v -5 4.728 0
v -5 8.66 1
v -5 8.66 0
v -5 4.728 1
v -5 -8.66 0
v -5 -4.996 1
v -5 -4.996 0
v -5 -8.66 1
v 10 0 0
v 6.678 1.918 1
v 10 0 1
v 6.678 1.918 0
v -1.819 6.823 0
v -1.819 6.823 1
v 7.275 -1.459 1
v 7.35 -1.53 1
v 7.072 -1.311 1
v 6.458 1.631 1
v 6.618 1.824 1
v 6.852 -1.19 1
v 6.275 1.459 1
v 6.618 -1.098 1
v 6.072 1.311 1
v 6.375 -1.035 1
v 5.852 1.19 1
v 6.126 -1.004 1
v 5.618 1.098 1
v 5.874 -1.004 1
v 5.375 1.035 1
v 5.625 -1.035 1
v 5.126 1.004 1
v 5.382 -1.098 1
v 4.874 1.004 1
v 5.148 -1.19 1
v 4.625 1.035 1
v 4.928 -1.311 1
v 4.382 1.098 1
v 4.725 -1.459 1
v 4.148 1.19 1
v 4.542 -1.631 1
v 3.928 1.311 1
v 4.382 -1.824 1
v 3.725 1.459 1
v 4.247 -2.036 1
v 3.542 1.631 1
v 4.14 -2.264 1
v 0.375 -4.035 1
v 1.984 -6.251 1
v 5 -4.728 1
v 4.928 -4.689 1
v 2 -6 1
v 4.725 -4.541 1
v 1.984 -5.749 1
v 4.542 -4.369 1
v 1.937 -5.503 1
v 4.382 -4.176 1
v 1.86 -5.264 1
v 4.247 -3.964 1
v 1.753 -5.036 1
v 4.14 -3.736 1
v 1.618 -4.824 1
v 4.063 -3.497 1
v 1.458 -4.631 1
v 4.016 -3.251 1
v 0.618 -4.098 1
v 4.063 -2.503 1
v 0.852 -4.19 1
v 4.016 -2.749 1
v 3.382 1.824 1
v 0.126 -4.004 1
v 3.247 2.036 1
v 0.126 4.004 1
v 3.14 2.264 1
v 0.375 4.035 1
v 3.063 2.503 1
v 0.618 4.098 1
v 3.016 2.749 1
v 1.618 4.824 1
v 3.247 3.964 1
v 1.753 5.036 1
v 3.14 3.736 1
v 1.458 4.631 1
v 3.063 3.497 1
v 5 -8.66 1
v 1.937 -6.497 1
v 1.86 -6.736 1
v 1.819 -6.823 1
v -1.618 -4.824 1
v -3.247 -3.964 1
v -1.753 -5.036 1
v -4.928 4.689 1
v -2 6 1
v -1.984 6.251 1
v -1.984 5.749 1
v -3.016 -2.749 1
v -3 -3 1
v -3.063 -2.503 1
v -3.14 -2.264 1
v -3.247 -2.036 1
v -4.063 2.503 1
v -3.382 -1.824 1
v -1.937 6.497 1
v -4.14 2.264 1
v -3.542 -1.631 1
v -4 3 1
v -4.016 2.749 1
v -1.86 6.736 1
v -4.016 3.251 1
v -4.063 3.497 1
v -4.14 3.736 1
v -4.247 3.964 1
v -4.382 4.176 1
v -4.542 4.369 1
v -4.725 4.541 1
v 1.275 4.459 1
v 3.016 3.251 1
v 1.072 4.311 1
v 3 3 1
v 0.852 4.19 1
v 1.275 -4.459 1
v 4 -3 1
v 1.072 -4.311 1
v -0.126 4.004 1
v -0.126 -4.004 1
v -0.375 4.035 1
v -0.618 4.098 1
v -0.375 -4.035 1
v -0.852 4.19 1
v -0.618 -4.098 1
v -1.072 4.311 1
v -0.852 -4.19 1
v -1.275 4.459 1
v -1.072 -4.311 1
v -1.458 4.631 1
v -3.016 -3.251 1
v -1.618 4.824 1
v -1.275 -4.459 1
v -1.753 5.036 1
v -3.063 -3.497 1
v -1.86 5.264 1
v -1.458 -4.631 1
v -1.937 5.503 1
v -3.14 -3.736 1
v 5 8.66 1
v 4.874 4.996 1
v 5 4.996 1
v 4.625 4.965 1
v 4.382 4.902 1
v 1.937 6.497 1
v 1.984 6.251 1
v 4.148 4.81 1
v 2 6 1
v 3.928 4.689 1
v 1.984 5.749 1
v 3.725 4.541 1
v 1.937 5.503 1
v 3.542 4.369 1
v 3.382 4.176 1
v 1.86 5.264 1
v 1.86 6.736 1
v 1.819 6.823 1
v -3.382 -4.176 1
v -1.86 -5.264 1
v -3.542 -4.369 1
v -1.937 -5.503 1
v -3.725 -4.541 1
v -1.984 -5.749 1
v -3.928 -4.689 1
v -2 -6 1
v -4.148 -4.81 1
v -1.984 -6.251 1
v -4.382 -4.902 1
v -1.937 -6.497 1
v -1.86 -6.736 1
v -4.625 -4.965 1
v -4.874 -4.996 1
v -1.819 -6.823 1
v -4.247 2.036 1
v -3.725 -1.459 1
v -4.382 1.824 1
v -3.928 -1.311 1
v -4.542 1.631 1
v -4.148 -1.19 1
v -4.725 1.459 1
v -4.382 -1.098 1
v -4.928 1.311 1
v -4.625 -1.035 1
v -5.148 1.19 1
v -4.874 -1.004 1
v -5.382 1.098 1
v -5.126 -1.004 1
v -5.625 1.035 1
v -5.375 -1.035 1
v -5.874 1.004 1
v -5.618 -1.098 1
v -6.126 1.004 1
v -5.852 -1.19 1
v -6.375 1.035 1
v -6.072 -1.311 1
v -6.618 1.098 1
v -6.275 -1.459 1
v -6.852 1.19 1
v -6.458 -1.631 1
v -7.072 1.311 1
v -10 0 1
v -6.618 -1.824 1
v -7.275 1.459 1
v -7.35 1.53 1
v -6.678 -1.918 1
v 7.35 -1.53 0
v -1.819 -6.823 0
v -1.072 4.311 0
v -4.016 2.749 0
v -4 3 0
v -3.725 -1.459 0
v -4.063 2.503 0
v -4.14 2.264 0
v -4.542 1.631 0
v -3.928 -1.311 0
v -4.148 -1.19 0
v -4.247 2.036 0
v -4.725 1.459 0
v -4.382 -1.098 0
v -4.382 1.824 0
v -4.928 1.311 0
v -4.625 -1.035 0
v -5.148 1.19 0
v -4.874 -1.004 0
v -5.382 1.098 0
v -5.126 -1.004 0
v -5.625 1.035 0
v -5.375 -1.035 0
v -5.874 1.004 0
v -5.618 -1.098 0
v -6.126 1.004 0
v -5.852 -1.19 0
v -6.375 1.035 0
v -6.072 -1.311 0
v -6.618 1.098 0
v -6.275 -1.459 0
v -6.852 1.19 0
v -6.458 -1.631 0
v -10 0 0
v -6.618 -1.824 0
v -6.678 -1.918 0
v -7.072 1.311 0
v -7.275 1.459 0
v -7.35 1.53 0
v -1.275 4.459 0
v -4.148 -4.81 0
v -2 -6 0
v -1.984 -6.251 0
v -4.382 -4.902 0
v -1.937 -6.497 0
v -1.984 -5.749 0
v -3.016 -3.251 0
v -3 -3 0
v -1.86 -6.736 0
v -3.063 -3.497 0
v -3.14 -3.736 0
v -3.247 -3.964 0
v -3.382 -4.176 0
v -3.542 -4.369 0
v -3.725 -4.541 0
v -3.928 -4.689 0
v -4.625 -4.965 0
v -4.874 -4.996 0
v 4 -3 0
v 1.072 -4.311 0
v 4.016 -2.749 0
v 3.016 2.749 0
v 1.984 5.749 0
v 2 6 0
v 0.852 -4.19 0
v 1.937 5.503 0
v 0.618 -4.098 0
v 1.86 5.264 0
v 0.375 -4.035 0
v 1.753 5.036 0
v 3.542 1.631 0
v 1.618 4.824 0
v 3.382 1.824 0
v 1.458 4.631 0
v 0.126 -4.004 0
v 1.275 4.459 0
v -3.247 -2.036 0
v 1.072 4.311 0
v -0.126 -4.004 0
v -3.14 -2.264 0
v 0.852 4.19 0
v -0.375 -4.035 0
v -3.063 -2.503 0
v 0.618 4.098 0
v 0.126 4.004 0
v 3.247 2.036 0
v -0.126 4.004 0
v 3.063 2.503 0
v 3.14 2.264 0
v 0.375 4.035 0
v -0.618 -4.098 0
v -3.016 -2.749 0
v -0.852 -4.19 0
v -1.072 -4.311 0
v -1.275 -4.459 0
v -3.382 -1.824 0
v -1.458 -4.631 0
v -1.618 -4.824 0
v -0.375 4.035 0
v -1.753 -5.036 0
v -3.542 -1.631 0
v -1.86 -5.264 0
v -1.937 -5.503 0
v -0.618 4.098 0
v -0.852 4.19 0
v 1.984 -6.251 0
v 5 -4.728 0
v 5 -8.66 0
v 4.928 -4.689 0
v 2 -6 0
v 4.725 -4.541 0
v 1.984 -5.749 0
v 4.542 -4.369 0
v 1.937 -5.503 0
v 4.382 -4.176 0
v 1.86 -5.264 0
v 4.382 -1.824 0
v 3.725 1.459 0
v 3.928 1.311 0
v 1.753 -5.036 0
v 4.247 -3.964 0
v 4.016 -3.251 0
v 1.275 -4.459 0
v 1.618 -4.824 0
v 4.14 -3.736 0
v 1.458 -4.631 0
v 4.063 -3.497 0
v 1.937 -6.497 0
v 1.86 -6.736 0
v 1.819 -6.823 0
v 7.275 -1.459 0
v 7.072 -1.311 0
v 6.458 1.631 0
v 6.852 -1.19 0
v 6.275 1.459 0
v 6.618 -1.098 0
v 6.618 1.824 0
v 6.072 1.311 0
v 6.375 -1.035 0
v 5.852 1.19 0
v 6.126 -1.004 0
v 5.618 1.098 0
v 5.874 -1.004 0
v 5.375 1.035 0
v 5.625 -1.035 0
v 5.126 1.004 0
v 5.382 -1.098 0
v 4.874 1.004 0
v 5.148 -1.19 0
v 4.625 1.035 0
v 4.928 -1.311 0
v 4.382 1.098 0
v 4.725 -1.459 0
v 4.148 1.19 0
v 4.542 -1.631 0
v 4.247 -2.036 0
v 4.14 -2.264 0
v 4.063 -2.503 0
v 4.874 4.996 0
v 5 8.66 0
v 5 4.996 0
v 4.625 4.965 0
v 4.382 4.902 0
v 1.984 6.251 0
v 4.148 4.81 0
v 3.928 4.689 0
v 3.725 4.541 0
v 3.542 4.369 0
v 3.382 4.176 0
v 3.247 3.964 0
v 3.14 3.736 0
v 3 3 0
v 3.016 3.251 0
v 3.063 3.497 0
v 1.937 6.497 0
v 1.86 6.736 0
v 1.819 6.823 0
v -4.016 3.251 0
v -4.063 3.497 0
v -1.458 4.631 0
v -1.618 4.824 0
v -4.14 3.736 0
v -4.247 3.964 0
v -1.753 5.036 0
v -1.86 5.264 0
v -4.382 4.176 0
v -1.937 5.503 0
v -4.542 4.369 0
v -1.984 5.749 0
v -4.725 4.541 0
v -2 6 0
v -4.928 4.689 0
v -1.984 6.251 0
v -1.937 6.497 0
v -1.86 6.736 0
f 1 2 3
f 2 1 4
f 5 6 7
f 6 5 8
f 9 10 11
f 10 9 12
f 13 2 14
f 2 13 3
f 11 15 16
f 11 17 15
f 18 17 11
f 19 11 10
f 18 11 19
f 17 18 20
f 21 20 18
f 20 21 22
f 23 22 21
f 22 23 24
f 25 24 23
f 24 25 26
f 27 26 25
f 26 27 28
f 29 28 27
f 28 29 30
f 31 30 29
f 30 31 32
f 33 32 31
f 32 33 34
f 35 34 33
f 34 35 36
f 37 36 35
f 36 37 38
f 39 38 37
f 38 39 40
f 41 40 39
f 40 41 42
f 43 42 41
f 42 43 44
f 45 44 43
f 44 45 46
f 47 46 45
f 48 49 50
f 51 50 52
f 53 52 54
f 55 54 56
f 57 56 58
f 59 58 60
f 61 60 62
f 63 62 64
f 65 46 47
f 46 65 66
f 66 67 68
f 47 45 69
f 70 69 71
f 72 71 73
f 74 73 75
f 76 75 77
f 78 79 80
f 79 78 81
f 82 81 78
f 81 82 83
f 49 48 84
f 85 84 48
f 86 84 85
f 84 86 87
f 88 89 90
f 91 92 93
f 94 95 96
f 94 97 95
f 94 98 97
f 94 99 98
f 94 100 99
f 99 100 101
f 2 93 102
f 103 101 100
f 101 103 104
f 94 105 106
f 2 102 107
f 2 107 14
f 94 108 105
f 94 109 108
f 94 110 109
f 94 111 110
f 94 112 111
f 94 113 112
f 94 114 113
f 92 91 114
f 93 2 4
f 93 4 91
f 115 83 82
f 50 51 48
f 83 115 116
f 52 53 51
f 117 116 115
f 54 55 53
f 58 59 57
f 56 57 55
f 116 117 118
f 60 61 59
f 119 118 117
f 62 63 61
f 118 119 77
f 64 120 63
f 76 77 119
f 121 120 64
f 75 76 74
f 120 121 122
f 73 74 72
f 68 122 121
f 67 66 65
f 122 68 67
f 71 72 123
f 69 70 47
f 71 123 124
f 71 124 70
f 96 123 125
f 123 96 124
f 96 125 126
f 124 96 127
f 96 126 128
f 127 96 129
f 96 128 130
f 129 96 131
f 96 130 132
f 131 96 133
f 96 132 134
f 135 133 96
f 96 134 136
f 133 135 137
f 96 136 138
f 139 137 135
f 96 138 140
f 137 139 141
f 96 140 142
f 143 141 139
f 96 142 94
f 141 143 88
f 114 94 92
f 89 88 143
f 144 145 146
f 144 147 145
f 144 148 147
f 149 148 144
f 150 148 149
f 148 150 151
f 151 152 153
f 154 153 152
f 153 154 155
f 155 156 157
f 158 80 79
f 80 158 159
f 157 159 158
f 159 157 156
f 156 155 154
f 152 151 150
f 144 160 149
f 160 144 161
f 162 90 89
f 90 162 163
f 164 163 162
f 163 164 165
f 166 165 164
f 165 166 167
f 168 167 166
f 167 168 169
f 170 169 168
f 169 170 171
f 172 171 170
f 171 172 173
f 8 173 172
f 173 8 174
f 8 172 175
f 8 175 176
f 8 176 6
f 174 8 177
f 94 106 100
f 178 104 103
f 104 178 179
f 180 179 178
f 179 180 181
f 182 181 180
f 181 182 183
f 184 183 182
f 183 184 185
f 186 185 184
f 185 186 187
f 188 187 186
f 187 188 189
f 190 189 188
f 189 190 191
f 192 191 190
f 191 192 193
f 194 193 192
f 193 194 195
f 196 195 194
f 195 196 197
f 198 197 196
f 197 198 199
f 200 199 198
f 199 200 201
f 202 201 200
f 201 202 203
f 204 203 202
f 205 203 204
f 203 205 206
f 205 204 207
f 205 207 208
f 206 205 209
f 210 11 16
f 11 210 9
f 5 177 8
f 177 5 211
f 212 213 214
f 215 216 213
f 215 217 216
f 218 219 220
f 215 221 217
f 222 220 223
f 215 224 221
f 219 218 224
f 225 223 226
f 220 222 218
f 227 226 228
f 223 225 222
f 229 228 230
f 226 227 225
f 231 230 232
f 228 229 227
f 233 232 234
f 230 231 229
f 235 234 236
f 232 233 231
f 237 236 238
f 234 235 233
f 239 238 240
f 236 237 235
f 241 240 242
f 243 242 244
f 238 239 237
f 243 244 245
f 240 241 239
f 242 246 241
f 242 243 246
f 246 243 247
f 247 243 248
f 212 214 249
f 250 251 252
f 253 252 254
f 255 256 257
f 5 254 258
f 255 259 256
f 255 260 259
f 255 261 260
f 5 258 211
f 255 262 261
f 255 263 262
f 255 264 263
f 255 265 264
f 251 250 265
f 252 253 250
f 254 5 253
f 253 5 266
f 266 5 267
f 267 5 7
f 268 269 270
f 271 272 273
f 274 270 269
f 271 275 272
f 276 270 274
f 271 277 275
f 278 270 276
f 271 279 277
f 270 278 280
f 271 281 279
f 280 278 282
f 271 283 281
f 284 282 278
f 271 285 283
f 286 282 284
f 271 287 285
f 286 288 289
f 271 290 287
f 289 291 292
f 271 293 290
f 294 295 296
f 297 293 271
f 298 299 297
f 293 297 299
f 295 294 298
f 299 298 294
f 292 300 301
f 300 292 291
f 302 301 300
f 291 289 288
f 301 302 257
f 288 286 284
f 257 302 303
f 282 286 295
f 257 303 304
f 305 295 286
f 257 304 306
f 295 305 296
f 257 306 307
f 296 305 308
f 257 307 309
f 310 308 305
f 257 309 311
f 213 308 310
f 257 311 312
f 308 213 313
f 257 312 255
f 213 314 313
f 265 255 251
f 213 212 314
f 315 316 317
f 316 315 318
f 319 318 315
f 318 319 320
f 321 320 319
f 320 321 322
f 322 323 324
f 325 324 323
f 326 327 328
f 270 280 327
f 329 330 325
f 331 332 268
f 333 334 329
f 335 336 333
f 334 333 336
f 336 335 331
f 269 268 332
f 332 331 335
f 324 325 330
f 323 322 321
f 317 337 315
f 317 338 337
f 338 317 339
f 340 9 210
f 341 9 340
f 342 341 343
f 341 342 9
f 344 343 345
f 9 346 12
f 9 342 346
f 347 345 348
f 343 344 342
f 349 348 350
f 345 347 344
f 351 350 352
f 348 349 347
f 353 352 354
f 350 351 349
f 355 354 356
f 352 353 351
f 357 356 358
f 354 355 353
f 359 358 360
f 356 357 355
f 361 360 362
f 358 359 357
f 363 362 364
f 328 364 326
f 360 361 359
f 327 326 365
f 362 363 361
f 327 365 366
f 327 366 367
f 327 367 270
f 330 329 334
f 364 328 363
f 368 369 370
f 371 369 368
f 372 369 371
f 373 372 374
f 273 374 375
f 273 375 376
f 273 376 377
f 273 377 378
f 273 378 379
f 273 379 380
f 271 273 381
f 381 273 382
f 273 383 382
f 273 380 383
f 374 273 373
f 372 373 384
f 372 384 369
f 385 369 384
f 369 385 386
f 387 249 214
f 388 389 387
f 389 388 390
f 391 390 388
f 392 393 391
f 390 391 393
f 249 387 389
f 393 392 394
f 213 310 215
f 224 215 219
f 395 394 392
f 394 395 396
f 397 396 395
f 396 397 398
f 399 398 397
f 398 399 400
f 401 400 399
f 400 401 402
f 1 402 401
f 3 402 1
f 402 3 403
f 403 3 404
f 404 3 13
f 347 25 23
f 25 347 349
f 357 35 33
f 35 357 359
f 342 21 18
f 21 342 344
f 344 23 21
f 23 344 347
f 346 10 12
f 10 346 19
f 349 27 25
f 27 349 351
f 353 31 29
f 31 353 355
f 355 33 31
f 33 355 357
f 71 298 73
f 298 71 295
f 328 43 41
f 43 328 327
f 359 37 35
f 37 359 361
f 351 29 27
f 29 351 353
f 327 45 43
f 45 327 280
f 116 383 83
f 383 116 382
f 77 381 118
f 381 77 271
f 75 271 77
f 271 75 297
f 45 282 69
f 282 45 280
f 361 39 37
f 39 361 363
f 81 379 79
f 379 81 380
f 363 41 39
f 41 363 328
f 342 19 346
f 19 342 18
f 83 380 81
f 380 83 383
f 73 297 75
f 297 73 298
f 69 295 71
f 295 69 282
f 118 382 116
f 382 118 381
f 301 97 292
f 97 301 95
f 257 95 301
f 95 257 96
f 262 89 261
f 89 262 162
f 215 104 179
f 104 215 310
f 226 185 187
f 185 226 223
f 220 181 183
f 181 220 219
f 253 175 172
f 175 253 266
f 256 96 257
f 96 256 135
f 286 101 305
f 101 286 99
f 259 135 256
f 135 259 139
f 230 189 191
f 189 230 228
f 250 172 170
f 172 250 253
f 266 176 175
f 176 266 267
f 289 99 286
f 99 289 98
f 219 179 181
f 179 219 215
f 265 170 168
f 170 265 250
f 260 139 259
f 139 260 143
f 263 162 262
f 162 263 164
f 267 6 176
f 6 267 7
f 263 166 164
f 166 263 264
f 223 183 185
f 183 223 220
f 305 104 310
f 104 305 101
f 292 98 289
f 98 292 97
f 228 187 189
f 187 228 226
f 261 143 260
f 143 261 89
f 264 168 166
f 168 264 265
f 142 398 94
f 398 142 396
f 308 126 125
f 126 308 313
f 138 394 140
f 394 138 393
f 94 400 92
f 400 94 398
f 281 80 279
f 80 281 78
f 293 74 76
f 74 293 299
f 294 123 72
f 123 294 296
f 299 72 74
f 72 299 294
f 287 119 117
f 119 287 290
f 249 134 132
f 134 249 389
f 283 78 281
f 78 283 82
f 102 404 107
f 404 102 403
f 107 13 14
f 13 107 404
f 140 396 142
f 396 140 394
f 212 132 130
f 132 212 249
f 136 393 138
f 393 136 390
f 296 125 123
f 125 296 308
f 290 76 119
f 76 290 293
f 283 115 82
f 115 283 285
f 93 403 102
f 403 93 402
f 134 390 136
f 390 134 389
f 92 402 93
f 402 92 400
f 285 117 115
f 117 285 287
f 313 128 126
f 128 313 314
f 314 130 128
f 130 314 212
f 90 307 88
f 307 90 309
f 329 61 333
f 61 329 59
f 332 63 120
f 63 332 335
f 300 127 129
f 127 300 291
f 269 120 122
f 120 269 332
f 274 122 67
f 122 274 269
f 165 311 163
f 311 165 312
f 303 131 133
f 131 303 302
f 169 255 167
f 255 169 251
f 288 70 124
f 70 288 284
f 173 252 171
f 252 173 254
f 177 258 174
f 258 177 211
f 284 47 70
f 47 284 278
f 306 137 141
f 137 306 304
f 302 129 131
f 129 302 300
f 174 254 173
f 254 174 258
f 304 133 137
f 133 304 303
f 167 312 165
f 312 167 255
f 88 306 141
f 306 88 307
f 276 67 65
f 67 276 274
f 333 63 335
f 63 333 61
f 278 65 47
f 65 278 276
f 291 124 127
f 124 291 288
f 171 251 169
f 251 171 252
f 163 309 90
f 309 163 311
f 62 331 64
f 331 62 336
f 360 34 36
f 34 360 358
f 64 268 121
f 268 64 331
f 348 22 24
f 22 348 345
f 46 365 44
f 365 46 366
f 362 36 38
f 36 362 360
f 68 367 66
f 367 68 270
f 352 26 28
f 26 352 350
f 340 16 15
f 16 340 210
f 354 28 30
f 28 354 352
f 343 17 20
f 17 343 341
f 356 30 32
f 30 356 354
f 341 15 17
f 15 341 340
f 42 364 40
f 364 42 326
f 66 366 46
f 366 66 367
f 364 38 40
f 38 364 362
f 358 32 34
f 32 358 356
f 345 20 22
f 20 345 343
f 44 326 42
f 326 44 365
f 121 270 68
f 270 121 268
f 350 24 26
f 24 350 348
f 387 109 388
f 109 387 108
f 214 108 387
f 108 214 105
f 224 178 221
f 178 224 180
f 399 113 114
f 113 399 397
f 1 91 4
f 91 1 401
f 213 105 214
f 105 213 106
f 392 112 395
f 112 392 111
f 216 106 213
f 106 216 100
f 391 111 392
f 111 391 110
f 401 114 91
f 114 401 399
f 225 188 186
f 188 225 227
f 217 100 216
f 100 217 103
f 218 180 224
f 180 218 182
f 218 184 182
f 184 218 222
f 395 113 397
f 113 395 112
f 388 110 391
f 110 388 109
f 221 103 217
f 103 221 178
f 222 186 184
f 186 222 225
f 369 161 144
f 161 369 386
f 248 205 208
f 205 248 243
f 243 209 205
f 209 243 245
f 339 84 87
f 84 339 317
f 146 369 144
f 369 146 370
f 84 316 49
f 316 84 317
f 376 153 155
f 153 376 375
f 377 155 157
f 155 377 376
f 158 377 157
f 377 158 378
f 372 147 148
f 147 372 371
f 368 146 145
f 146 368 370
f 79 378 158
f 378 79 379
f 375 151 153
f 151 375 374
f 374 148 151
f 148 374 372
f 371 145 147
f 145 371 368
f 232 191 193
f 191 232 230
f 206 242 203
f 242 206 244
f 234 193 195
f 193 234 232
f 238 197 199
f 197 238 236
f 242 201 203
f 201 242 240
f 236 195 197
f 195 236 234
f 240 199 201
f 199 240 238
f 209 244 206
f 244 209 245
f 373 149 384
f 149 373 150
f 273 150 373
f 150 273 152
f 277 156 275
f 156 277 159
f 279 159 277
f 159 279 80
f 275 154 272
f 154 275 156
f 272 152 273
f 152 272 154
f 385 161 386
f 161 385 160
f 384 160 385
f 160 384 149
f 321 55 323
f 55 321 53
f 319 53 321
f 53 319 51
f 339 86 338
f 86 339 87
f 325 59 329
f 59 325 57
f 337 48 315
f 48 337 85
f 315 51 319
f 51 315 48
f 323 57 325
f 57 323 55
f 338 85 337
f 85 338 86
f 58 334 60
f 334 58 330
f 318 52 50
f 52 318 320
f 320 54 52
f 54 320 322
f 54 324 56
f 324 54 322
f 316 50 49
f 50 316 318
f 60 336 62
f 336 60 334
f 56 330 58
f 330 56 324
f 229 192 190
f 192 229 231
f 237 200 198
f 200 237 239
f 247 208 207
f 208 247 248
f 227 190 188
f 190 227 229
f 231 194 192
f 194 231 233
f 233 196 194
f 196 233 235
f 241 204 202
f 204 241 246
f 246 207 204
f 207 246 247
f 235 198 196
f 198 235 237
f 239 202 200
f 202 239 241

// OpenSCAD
//сюрикен
difference () {
cylinder (1, 10, 10, $fn=3);
translate ([5,3,-2])cylinder (5, 2, 2, $fn=50);
translate ([-5,-3,-2])cylinder (5, 2, 2, $fn=50);
translate ([0,6,-2])cylinder (5, 2, 2, $fn=50);
translate ([0,-6,-2])cylinder (5, 2, 2, $fn=50);
translate ([6,-3,-2])cylinder (5, 2, 2, $fn=50);
translate ([-6,3,-2])cylinder (5, 2, 2, $fn=50);
}
difference () {
rotate ([0, 0, 60])cylinder (1, 10, 10, $fn=3);
translate ([5,3,-2])cylinder (5, 2, 2, $fn=50);
translate ([-5,-3,-2])cylinder (5, 2, 2, $fn=50);
translate ([0,6,-2])cylinder (5, 2, 2, $fn=50);
translate ([0,-6,-2])cylinder (5, 2, 2, $fn=50);
translate ([6,-3,-2])cylinder (5, 2, 2, $fn=50);
translate ([-6,3,-2])cylinder (5, 2, 2, $fn=50);
}
